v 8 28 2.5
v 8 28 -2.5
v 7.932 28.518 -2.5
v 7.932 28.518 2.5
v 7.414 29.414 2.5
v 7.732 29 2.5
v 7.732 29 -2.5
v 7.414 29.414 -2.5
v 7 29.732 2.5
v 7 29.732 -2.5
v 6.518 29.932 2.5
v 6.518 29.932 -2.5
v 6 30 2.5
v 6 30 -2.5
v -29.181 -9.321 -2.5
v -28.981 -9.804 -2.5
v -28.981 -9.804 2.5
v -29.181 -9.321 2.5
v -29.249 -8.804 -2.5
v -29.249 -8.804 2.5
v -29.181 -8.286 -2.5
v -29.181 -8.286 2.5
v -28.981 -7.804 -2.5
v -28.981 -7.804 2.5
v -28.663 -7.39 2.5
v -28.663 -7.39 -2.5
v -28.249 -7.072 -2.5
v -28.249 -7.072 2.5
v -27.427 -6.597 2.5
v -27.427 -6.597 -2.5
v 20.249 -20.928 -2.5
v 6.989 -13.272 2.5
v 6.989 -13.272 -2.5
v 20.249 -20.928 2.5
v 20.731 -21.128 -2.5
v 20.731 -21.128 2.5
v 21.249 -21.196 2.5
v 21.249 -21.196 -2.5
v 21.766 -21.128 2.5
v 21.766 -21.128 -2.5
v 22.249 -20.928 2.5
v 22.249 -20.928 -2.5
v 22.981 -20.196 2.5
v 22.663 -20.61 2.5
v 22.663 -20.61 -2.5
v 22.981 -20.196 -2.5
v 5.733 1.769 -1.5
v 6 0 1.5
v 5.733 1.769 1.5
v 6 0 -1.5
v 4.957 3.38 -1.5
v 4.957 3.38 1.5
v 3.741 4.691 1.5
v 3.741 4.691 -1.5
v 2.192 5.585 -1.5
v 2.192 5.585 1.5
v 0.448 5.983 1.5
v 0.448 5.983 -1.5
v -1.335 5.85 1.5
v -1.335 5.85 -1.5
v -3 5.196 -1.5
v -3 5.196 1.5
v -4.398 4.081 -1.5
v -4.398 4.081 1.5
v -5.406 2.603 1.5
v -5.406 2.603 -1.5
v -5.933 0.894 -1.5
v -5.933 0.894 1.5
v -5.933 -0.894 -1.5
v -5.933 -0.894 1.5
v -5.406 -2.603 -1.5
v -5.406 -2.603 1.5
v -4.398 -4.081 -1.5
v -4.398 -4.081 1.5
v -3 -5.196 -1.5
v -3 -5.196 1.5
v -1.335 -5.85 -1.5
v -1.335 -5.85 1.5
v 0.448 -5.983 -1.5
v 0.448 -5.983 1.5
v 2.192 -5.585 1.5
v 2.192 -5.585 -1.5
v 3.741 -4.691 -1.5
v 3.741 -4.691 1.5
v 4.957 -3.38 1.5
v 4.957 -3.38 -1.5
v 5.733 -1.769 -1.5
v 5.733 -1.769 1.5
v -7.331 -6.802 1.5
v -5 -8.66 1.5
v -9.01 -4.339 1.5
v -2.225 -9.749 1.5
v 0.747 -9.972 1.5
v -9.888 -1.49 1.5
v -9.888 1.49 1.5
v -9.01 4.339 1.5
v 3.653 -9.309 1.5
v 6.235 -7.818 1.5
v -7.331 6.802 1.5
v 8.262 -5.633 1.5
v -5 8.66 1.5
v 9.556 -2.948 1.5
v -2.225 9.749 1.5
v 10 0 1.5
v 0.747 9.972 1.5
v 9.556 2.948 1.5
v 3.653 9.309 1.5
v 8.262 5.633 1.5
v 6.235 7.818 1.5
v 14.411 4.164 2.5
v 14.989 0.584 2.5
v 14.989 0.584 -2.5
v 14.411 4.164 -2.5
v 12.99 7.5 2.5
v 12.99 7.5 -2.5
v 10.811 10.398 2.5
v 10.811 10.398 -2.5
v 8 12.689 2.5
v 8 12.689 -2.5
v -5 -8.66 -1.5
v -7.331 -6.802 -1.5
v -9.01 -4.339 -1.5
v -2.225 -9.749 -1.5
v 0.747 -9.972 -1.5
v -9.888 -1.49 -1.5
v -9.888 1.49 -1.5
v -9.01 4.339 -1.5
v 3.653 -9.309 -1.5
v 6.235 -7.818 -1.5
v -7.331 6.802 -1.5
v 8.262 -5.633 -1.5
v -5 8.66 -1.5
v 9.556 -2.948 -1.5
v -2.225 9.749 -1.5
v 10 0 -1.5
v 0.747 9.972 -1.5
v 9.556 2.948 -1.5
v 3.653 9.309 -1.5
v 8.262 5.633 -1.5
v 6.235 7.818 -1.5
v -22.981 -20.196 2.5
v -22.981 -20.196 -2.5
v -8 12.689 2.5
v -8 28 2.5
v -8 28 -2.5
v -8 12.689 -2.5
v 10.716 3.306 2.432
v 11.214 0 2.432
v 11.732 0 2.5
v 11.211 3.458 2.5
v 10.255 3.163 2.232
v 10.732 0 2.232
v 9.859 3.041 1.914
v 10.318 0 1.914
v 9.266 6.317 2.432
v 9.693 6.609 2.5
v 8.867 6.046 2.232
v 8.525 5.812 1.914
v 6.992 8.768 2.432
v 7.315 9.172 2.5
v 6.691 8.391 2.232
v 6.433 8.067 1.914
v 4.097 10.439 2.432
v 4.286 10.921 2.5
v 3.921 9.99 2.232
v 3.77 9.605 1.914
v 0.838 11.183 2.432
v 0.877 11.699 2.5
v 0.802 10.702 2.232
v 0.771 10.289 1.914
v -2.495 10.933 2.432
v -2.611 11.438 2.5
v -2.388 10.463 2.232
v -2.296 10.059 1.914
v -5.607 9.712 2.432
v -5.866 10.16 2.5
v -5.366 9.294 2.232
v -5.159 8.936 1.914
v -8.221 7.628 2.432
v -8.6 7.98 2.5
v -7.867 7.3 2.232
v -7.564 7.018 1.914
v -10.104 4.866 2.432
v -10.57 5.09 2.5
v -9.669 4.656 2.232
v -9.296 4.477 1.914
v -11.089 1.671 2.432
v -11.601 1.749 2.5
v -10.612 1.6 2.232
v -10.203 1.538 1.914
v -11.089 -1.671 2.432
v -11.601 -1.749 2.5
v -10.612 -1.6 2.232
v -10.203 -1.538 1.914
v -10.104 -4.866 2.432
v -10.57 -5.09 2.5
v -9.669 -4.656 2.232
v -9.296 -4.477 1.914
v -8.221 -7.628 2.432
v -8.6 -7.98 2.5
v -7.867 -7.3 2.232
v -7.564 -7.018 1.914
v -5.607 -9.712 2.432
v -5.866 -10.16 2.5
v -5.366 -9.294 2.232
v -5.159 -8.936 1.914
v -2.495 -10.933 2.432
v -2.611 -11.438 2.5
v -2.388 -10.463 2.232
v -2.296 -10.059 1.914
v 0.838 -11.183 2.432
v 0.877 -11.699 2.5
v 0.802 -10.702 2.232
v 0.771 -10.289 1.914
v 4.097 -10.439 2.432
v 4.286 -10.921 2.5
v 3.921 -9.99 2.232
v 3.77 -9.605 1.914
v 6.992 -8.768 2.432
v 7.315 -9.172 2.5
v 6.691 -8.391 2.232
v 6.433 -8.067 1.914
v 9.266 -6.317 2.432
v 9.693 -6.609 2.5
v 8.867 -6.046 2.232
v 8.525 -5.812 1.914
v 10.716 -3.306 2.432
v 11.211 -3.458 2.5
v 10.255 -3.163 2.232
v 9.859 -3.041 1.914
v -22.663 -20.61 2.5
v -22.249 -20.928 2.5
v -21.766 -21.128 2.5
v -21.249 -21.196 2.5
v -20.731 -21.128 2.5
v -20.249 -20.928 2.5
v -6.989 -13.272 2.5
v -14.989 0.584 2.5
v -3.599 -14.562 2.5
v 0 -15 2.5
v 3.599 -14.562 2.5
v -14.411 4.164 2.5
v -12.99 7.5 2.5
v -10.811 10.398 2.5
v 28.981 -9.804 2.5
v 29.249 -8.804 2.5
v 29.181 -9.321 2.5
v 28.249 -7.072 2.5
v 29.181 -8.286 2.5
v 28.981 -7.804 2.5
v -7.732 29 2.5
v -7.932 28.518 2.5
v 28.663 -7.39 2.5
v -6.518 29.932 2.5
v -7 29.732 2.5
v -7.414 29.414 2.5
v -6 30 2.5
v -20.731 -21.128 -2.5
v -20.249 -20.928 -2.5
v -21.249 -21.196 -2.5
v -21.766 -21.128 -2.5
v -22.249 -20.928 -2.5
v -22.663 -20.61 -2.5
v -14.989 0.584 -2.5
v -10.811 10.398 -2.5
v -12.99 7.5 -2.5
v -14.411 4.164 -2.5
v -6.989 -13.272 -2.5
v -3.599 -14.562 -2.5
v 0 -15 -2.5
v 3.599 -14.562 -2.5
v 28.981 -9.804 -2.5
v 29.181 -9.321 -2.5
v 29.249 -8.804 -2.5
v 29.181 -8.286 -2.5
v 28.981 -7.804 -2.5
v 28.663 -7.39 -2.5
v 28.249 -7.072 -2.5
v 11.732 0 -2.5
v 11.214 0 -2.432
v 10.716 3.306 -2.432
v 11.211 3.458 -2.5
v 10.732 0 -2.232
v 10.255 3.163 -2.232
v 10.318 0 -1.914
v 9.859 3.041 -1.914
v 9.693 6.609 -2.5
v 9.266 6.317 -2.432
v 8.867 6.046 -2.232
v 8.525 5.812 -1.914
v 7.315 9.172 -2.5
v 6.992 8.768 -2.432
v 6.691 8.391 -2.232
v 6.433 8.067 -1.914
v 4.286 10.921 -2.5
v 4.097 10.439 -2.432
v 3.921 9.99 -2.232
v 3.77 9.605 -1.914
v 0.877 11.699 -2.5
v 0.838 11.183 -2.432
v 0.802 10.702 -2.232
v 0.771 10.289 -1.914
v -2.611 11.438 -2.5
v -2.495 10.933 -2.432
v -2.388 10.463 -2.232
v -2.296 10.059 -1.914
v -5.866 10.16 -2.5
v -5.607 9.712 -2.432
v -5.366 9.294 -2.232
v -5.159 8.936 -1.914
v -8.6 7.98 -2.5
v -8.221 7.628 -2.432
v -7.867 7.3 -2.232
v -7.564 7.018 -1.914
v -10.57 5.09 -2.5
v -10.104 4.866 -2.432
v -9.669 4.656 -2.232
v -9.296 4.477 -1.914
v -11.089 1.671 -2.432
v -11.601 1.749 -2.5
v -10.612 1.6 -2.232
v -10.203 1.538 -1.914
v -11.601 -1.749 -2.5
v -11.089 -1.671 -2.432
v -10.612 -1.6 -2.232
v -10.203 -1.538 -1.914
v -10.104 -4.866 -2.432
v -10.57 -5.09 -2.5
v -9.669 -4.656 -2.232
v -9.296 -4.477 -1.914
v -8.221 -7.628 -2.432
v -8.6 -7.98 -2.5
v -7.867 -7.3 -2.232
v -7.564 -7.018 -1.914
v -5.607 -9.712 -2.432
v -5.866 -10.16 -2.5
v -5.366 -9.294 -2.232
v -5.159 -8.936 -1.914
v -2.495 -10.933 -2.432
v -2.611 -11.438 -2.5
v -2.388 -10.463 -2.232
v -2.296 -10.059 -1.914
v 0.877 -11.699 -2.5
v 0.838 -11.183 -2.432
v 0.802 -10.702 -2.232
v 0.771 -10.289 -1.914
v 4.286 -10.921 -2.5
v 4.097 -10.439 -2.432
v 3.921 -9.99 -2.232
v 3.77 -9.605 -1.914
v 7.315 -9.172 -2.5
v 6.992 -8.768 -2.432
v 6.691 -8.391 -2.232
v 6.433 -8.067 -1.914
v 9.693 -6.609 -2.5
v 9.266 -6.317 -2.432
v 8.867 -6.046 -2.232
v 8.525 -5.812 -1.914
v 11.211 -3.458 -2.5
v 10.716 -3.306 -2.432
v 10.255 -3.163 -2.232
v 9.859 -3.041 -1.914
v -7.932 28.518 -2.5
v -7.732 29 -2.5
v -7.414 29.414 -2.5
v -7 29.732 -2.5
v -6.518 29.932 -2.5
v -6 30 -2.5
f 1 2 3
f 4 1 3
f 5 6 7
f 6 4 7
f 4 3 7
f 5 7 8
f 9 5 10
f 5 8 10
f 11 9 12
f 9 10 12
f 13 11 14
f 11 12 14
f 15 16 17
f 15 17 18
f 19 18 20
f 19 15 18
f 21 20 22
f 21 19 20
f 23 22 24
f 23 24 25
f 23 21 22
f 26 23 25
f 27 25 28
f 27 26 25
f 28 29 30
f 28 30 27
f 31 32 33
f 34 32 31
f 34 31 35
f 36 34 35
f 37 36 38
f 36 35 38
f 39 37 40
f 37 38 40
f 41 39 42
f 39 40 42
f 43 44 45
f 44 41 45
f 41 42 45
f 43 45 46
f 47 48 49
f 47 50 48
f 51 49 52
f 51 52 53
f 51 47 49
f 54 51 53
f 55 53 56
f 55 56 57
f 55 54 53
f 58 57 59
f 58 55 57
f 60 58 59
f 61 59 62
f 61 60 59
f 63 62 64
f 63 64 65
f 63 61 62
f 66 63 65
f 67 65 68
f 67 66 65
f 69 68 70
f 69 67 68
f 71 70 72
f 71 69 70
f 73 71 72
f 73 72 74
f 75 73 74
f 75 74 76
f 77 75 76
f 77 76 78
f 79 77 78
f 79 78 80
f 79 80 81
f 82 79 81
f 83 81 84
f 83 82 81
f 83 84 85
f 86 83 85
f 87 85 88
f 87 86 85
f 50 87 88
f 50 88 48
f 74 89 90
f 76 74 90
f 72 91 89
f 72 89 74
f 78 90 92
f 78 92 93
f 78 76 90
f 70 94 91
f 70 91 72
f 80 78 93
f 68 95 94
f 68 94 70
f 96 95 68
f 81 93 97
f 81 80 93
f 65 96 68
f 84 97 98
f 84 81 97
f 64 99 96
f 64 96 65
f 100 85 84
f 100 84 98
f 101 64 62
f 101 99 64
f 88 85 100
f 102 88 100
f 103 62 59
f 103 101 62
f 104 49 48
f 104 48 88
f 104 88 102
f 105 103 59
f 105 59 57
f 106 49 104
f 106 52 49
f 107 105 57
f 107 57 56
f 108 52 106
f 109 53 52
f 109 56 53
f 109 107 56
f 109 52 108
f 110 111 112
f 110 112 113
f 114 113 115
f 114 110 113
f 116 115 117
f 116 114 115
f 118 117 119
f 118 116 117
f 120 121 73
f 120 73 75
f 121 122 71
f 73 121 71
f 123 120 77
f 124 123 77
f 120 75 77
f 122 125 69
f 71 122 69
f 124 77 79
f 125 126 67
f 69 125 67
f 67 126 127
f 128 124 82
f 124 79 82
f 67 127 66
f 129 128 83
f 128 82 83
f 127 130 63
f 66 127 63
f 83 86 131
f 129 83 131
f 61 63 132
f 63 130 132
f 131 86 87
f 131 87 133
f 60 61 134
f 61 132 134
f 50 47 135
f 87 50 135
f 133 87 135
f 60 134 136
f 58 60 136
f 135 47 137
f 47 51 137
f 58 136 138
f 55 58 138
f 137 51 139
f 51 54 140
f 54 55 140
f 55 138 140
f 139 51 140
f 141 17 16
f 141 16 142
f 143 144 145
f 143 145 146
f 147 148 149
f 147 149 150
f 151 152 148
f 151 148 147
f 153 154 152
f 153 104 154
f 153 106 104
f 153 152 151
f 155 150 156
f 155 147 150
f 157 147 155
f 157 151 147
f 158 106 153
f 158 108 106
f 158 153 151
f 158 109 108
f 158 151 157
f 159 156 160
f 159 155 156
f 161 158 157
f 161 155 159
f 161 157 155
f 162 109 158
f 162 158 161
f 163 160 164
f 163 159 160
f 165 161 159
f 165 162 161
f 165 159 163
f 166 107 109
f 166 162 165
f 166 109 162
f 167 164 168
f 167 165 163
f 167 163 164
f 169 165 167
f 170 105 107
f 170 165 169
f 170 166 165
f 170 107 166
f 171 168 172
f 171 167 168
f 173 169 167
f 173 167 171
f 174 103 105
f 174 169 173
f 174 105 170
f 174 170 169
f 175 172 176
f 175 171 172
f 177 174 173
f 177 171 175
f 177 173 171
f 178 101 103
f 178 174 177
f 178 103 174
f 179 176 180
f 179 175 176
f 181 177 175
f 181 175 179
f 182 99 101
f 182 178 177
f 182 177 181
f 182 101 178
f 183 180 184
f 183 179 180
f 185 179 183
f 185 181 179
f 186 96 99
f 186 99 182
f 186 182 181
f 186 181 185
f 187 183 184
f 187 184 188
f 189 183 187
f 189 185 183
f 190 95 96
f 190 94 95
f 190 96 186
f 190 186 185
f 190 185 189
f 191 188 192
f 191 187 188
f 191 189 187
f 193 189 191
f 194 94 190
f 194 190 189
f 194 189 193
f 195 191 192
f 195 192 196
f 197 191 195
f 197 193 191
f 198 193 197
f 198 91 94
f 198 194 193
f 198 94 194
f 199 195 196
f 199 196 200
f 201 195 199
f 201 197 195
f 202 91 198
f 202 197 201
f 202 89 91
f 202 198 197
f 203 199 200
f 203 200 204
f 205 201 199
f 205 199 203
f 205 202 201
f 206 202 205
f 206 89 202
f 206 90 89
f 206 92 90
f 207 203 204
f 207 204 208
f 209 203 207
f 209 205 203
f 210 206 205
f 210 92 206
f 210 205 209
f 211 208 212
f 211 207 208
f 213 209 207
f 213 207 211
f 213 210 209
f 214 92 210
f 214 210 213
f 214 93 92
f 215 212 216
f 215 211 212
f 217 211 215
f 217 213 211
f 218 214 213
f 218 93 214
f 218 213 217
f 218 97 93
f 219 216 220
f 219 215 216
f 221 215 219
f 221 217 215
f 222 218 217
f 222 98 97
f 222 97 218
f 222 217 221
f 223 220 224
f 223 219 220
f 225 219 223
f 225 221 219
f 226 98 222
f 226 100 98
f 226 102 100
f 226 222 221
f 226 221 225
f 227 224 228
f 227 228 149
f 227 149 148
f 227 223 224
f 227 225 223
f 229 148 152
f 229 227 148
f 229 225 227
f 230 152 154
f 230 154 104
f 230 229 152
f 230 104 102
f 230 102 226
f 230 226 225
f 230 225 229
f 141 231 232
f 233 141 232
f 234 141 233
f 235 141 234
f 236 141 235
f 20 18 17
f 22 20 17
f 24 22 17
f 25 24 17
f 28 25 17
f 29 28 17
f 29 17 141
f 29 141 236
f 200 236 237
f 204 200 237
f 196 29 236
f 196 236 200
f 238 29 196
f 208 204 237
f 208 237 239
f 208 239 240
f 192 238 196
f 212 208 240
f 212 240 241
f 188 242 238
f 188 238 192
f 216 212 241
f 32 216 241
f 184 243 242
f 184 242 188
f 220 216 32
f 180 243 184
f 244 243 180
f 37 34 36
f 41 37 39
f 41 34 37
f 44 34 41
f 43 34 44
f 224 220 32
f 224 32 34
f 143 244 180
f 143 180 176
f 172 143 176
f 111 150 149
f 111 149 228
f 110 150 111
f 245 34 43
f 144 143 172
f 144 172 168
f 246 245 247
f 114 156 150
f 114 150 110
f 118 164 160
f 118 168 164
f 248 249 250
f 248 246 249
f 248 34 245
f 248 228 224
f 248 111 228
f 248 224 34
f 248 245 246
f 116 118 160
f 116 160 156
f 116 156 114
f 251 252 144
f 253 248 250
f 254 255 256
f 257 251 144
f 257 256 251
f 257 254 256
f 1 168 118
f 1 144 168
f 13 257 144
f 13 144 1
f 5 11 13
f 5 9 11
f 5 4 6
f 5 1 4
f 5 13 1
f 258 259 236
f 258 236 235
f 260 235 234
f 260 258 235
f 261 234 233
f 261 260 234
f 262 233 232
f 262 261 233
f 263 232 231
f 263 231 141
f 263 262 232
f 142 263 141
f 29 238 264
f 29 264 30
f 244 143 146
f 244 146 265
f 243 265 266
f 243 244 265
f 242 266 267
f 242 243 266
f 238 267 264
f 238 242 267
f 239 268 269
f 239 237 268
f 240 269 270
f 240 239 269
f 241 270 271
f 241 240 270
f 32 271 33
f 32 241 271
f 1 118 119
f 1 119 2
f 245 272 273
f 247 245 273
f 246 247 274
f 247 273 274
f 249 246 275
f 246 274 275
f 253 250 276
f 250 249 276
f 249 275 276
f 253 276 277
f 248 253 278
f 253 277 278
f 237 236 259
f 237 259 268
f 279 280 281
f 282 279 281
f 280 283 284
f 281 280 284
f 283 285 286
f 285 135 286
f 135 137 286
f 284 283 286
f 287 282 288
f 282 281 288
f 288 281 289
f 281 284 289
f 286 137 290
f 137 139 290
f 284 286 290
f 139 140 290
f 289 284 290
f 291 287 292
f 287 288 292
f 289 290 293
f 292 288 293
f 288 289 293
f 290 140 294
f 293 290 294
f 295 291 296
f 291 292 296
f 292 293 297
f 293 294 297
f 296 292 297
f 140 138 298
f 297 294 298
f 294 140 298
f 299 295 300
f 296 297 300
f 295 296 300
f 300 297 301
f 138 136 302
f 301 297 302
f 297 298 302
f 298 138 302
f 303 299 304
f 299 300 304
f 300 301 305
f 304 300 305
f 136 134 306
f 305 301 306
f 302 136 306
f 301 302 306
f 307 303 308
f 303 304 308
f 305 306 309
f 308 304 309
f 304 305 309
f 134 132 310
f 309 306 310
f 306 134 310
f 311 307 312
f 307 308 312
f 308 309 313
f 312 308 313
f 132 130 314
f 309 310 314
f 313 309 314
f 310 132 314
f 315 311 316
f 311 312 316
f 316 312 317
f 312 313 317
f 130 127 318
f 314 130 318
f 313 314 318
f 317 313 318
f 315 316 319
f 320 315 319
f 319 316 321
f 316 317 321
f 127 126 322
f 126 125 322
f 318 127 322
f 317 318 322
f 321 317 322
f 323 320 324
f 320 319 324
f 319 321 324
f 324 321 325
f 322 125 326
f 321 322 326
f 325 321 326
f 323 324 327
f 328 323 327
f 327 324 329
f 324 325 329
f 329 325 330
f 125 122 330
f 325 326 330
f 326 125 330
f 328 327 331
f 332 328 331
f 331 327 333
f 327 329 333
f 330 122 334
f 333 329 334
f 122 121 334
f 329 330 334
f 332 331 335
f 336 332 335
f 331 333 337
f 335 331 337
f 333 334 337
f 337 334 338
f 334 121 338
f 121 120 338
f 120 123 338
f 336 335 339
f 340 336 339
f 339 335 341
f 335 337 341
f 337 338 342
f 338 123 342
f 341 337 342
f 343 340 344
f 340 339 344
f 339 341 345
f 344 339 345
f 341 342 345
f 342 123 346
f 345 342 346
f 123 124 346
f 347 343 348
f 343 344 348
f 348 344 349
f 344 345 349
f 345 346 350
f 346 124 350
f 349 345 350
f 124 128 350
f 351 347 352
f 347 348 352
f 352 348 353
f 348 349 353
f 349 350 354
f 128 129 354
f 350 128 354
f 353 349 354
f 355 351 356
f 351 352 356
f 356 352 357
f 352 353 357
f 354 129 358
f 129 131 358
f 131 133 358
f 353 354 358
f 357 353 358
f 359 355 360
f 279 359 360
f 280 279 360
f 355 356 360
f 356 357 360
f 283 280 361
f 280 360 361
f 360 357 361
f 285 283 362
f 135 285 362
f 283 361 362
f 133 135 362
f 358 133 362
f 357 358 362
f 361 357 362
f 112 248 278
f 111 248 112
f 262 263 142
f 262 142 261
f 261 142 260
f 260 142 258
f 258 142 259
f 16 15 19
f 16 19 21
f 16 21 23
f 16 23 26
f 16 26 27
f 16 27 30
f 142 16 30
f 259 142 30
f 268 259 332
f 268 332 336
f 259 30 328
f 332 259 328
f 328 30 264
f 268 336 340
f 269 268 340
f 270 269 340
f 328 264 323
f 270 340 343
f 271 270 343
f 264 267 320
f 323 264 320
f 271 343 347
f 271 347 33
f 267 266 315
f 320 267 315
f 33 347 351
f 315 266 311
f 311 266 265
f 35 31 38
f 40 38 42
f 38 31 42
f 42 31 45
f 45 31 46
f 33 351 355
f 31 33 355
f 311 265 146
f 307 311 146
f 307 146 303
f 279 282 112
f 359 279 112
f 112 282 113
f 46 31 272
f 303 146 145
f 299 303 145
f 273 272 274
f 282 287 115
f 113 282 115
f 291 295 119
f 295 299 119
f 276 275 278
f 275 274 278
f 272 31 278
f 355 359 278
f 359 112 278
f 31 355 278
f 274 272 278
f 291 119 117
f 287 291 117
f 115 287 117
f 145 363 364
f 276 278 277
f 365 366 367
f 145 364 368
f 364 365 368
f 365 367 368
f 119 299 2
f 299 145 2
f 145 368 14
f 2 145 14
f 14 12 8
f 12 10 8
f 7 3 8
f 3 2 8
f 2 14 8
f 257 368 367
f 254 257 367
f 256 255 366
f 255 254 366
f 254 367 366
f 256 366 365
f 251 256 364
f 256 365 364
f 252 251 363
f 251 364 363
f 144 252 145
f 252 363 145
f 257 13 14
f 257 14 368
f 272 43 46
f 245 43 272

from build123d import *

# Parameters (mm, degrees)
F0_R        = 10
F1_DEPTH    = 2.5
F0_R_2      = 6
F2_DEPTH    = 1.5
F3_T1_DEPTH = 15


# Not quite as in the source:
# - a fillet or chamfer that OpenCascade refuses, or shapes differently, is made with other operations: its cross-section is extruded or revolved along the edge and cut away or added


with BuildPart() as f1:
    # F0 (on Top) → F1 (new body, symmetric)
    with BuildSketch(Plane.XY):
        with BuildLine():
            Line((25.9807621135, -15), (29.9807621135, -8.0717967697))
            Line((29.9807621135, -8.0717967697), (14.9886304879, 0.5839144601))
            ThreePointArc((14.9886304879, 0.5839144601), (12.9903810568, 7.5), (8, 12.6885775404))
            Line((8, 12.6885775404), (8, 30))
            Line((8, 30), (-8, 30))
            Line((-8, 30), (-8, 12.6885775404))
            ThreePointArc((-8, 12.6885775404), (-12.9903810568, 7.5), (-14.9886304879, 0.5839144601))
            Line((-14.9886304879, 0.5839144601), (-27.4269246123, -6.5973380009))
            Line((-27.4269246123, -6.5973380009), (-29.9807621135, -8.0717967697))
            Line((-29.9807621135, -8.0717967697), (-21.9807621135, -21.9282032303))
            Line((-21.9807621135, -21.9282032303), (-6.9886304879, -13.2724920005))
            ThreePointArc((-6.9886304879, -13.2724920005), (0, -15), (6.9886304879, -13.2724920005))
            Line((6.9886304879, -13.2724920005), (21.9807621135, -21.9282032303))
            Line((21.9807621135, -21.9282032303), (25.9807621135, -15))
        make_face()
        Circle(F0_R, mode=Mode.SUBTRACT)
    extrude(amount=F1_DEPTH, both=True)

    # F0 (on Top) → F2 (join, symmetric)
    with BuildSketch(Plane.XY):
        Circle(F0_R)
        Circle(F0_R_2, mode=Mode.SUBTRACT)
    extrude(amount=F2_DEPTH, both=True)

    # F3: fillet of radius 2 on 8 edges, made by hand

    # F3_s2 → F3_t1 (cut)
    with BuildSketch(Plane.XY.offset(-7.5)):
        with BuildLine():
            ThreePointArc((-28.9807621135, -9.8038475773), (-29.1805629585, -8.2862094871), (-28.248711306, -7.0717967697))
            Line((-28.248711306, -7.0717967697), (-29.9807621135, -8.0717967697))
            Line((-29.9807621135, -8.0717967697), (-28.9807621135, -9.8038475773))
        make_face()
        with BuildLine():
            ThreePointArc((-20.248711306, -20.9282032303), (-21.7663493962, -21.1280040753), (-22.9807621135, -20.1961524227))
            Line((-22.9807621135, -20.1961524227), (-21.9807621135, -21.9282032303))
            Line((-21.9807621135, -21.9282032303), (-20.248711306, -20.9282032303))
        make_face()
        with BuildLine():
            ThreePointArc((20.248711306, -20.9282032303), (21.7663493962, -21.1280040753), (22.9807621135, -20.1961524227))
            Line((22.9807621135, -20.1961524227), (21.9807621135, -21.9282032303))
            Line((21.9807621135, -21.9282032303), (20.248711306, -20.9282032303))
        make_face()
        with BuildLine():
            ThreePointArc((28.9807621135, -9.8038475773), (29.1805629585, -8.2862094871), (28.248711306, -7.0717967697))
            Line((28.248711306, -7.0717967697), (29.9807621135, -8.0717967697))
            Line((29.9807621135, -8.0717967697), (28.9807621135, -9.8038475773))
        make_face()
        with BuildLine():
            ThreePointArc((8, 28), (7.4142135624, 29.4142135624), (6, 30))
            Line((6, 30), (8, 30))
            Line((8, 30), (8, 28))
        make_face()
        with BuildLine():
            ThreePointArc((-6, 30), (-7.4142135624, 29.4142135624), (-8, 28))
            Line((-8, 28), (-8, 30))
            Line((-8, 30), (-6, 30))
        make_face()
    extrude(amount=F3_T1_DEPTH, mode=Mode.SUBTRACT)

    # F3_s3 → F3_t4 (revolve, cut)
    with BuildSketch(Plane.XZ):
        with BuildLine():
            ThreePointArc((11.7320508076, 2.5), (10.7320508076, 2.2320508076), (10, 1.5))
            Line((10, 1.5), (10, 2.5))
            Line((10, 2.5), (11.7320508076, 2.5))
        make_face()
    revolve(axis=Axis((0, 0, 2.5), (0, 0, 1)), mode=Mode.SUBTRACT)

    # F3_s5 → F3_t6 (revolve, cut)
    with BuildSketch(Plane.XZ):
        with BuildLine():
            ThreePointArc((11.7320508076, -2.5), (10.7320508076, -2.2320508076), (10, -1.5))
            Line((10, -1.5), (10, -2.5))
            Line((10, -2.5), (11.7320508076, -2.5))
        make_face()
    revolve(axis=Axis((0, 0, -2.5), (0, 0, 1)), mode=Mode.SUBTRACT)


solid = f1.part
